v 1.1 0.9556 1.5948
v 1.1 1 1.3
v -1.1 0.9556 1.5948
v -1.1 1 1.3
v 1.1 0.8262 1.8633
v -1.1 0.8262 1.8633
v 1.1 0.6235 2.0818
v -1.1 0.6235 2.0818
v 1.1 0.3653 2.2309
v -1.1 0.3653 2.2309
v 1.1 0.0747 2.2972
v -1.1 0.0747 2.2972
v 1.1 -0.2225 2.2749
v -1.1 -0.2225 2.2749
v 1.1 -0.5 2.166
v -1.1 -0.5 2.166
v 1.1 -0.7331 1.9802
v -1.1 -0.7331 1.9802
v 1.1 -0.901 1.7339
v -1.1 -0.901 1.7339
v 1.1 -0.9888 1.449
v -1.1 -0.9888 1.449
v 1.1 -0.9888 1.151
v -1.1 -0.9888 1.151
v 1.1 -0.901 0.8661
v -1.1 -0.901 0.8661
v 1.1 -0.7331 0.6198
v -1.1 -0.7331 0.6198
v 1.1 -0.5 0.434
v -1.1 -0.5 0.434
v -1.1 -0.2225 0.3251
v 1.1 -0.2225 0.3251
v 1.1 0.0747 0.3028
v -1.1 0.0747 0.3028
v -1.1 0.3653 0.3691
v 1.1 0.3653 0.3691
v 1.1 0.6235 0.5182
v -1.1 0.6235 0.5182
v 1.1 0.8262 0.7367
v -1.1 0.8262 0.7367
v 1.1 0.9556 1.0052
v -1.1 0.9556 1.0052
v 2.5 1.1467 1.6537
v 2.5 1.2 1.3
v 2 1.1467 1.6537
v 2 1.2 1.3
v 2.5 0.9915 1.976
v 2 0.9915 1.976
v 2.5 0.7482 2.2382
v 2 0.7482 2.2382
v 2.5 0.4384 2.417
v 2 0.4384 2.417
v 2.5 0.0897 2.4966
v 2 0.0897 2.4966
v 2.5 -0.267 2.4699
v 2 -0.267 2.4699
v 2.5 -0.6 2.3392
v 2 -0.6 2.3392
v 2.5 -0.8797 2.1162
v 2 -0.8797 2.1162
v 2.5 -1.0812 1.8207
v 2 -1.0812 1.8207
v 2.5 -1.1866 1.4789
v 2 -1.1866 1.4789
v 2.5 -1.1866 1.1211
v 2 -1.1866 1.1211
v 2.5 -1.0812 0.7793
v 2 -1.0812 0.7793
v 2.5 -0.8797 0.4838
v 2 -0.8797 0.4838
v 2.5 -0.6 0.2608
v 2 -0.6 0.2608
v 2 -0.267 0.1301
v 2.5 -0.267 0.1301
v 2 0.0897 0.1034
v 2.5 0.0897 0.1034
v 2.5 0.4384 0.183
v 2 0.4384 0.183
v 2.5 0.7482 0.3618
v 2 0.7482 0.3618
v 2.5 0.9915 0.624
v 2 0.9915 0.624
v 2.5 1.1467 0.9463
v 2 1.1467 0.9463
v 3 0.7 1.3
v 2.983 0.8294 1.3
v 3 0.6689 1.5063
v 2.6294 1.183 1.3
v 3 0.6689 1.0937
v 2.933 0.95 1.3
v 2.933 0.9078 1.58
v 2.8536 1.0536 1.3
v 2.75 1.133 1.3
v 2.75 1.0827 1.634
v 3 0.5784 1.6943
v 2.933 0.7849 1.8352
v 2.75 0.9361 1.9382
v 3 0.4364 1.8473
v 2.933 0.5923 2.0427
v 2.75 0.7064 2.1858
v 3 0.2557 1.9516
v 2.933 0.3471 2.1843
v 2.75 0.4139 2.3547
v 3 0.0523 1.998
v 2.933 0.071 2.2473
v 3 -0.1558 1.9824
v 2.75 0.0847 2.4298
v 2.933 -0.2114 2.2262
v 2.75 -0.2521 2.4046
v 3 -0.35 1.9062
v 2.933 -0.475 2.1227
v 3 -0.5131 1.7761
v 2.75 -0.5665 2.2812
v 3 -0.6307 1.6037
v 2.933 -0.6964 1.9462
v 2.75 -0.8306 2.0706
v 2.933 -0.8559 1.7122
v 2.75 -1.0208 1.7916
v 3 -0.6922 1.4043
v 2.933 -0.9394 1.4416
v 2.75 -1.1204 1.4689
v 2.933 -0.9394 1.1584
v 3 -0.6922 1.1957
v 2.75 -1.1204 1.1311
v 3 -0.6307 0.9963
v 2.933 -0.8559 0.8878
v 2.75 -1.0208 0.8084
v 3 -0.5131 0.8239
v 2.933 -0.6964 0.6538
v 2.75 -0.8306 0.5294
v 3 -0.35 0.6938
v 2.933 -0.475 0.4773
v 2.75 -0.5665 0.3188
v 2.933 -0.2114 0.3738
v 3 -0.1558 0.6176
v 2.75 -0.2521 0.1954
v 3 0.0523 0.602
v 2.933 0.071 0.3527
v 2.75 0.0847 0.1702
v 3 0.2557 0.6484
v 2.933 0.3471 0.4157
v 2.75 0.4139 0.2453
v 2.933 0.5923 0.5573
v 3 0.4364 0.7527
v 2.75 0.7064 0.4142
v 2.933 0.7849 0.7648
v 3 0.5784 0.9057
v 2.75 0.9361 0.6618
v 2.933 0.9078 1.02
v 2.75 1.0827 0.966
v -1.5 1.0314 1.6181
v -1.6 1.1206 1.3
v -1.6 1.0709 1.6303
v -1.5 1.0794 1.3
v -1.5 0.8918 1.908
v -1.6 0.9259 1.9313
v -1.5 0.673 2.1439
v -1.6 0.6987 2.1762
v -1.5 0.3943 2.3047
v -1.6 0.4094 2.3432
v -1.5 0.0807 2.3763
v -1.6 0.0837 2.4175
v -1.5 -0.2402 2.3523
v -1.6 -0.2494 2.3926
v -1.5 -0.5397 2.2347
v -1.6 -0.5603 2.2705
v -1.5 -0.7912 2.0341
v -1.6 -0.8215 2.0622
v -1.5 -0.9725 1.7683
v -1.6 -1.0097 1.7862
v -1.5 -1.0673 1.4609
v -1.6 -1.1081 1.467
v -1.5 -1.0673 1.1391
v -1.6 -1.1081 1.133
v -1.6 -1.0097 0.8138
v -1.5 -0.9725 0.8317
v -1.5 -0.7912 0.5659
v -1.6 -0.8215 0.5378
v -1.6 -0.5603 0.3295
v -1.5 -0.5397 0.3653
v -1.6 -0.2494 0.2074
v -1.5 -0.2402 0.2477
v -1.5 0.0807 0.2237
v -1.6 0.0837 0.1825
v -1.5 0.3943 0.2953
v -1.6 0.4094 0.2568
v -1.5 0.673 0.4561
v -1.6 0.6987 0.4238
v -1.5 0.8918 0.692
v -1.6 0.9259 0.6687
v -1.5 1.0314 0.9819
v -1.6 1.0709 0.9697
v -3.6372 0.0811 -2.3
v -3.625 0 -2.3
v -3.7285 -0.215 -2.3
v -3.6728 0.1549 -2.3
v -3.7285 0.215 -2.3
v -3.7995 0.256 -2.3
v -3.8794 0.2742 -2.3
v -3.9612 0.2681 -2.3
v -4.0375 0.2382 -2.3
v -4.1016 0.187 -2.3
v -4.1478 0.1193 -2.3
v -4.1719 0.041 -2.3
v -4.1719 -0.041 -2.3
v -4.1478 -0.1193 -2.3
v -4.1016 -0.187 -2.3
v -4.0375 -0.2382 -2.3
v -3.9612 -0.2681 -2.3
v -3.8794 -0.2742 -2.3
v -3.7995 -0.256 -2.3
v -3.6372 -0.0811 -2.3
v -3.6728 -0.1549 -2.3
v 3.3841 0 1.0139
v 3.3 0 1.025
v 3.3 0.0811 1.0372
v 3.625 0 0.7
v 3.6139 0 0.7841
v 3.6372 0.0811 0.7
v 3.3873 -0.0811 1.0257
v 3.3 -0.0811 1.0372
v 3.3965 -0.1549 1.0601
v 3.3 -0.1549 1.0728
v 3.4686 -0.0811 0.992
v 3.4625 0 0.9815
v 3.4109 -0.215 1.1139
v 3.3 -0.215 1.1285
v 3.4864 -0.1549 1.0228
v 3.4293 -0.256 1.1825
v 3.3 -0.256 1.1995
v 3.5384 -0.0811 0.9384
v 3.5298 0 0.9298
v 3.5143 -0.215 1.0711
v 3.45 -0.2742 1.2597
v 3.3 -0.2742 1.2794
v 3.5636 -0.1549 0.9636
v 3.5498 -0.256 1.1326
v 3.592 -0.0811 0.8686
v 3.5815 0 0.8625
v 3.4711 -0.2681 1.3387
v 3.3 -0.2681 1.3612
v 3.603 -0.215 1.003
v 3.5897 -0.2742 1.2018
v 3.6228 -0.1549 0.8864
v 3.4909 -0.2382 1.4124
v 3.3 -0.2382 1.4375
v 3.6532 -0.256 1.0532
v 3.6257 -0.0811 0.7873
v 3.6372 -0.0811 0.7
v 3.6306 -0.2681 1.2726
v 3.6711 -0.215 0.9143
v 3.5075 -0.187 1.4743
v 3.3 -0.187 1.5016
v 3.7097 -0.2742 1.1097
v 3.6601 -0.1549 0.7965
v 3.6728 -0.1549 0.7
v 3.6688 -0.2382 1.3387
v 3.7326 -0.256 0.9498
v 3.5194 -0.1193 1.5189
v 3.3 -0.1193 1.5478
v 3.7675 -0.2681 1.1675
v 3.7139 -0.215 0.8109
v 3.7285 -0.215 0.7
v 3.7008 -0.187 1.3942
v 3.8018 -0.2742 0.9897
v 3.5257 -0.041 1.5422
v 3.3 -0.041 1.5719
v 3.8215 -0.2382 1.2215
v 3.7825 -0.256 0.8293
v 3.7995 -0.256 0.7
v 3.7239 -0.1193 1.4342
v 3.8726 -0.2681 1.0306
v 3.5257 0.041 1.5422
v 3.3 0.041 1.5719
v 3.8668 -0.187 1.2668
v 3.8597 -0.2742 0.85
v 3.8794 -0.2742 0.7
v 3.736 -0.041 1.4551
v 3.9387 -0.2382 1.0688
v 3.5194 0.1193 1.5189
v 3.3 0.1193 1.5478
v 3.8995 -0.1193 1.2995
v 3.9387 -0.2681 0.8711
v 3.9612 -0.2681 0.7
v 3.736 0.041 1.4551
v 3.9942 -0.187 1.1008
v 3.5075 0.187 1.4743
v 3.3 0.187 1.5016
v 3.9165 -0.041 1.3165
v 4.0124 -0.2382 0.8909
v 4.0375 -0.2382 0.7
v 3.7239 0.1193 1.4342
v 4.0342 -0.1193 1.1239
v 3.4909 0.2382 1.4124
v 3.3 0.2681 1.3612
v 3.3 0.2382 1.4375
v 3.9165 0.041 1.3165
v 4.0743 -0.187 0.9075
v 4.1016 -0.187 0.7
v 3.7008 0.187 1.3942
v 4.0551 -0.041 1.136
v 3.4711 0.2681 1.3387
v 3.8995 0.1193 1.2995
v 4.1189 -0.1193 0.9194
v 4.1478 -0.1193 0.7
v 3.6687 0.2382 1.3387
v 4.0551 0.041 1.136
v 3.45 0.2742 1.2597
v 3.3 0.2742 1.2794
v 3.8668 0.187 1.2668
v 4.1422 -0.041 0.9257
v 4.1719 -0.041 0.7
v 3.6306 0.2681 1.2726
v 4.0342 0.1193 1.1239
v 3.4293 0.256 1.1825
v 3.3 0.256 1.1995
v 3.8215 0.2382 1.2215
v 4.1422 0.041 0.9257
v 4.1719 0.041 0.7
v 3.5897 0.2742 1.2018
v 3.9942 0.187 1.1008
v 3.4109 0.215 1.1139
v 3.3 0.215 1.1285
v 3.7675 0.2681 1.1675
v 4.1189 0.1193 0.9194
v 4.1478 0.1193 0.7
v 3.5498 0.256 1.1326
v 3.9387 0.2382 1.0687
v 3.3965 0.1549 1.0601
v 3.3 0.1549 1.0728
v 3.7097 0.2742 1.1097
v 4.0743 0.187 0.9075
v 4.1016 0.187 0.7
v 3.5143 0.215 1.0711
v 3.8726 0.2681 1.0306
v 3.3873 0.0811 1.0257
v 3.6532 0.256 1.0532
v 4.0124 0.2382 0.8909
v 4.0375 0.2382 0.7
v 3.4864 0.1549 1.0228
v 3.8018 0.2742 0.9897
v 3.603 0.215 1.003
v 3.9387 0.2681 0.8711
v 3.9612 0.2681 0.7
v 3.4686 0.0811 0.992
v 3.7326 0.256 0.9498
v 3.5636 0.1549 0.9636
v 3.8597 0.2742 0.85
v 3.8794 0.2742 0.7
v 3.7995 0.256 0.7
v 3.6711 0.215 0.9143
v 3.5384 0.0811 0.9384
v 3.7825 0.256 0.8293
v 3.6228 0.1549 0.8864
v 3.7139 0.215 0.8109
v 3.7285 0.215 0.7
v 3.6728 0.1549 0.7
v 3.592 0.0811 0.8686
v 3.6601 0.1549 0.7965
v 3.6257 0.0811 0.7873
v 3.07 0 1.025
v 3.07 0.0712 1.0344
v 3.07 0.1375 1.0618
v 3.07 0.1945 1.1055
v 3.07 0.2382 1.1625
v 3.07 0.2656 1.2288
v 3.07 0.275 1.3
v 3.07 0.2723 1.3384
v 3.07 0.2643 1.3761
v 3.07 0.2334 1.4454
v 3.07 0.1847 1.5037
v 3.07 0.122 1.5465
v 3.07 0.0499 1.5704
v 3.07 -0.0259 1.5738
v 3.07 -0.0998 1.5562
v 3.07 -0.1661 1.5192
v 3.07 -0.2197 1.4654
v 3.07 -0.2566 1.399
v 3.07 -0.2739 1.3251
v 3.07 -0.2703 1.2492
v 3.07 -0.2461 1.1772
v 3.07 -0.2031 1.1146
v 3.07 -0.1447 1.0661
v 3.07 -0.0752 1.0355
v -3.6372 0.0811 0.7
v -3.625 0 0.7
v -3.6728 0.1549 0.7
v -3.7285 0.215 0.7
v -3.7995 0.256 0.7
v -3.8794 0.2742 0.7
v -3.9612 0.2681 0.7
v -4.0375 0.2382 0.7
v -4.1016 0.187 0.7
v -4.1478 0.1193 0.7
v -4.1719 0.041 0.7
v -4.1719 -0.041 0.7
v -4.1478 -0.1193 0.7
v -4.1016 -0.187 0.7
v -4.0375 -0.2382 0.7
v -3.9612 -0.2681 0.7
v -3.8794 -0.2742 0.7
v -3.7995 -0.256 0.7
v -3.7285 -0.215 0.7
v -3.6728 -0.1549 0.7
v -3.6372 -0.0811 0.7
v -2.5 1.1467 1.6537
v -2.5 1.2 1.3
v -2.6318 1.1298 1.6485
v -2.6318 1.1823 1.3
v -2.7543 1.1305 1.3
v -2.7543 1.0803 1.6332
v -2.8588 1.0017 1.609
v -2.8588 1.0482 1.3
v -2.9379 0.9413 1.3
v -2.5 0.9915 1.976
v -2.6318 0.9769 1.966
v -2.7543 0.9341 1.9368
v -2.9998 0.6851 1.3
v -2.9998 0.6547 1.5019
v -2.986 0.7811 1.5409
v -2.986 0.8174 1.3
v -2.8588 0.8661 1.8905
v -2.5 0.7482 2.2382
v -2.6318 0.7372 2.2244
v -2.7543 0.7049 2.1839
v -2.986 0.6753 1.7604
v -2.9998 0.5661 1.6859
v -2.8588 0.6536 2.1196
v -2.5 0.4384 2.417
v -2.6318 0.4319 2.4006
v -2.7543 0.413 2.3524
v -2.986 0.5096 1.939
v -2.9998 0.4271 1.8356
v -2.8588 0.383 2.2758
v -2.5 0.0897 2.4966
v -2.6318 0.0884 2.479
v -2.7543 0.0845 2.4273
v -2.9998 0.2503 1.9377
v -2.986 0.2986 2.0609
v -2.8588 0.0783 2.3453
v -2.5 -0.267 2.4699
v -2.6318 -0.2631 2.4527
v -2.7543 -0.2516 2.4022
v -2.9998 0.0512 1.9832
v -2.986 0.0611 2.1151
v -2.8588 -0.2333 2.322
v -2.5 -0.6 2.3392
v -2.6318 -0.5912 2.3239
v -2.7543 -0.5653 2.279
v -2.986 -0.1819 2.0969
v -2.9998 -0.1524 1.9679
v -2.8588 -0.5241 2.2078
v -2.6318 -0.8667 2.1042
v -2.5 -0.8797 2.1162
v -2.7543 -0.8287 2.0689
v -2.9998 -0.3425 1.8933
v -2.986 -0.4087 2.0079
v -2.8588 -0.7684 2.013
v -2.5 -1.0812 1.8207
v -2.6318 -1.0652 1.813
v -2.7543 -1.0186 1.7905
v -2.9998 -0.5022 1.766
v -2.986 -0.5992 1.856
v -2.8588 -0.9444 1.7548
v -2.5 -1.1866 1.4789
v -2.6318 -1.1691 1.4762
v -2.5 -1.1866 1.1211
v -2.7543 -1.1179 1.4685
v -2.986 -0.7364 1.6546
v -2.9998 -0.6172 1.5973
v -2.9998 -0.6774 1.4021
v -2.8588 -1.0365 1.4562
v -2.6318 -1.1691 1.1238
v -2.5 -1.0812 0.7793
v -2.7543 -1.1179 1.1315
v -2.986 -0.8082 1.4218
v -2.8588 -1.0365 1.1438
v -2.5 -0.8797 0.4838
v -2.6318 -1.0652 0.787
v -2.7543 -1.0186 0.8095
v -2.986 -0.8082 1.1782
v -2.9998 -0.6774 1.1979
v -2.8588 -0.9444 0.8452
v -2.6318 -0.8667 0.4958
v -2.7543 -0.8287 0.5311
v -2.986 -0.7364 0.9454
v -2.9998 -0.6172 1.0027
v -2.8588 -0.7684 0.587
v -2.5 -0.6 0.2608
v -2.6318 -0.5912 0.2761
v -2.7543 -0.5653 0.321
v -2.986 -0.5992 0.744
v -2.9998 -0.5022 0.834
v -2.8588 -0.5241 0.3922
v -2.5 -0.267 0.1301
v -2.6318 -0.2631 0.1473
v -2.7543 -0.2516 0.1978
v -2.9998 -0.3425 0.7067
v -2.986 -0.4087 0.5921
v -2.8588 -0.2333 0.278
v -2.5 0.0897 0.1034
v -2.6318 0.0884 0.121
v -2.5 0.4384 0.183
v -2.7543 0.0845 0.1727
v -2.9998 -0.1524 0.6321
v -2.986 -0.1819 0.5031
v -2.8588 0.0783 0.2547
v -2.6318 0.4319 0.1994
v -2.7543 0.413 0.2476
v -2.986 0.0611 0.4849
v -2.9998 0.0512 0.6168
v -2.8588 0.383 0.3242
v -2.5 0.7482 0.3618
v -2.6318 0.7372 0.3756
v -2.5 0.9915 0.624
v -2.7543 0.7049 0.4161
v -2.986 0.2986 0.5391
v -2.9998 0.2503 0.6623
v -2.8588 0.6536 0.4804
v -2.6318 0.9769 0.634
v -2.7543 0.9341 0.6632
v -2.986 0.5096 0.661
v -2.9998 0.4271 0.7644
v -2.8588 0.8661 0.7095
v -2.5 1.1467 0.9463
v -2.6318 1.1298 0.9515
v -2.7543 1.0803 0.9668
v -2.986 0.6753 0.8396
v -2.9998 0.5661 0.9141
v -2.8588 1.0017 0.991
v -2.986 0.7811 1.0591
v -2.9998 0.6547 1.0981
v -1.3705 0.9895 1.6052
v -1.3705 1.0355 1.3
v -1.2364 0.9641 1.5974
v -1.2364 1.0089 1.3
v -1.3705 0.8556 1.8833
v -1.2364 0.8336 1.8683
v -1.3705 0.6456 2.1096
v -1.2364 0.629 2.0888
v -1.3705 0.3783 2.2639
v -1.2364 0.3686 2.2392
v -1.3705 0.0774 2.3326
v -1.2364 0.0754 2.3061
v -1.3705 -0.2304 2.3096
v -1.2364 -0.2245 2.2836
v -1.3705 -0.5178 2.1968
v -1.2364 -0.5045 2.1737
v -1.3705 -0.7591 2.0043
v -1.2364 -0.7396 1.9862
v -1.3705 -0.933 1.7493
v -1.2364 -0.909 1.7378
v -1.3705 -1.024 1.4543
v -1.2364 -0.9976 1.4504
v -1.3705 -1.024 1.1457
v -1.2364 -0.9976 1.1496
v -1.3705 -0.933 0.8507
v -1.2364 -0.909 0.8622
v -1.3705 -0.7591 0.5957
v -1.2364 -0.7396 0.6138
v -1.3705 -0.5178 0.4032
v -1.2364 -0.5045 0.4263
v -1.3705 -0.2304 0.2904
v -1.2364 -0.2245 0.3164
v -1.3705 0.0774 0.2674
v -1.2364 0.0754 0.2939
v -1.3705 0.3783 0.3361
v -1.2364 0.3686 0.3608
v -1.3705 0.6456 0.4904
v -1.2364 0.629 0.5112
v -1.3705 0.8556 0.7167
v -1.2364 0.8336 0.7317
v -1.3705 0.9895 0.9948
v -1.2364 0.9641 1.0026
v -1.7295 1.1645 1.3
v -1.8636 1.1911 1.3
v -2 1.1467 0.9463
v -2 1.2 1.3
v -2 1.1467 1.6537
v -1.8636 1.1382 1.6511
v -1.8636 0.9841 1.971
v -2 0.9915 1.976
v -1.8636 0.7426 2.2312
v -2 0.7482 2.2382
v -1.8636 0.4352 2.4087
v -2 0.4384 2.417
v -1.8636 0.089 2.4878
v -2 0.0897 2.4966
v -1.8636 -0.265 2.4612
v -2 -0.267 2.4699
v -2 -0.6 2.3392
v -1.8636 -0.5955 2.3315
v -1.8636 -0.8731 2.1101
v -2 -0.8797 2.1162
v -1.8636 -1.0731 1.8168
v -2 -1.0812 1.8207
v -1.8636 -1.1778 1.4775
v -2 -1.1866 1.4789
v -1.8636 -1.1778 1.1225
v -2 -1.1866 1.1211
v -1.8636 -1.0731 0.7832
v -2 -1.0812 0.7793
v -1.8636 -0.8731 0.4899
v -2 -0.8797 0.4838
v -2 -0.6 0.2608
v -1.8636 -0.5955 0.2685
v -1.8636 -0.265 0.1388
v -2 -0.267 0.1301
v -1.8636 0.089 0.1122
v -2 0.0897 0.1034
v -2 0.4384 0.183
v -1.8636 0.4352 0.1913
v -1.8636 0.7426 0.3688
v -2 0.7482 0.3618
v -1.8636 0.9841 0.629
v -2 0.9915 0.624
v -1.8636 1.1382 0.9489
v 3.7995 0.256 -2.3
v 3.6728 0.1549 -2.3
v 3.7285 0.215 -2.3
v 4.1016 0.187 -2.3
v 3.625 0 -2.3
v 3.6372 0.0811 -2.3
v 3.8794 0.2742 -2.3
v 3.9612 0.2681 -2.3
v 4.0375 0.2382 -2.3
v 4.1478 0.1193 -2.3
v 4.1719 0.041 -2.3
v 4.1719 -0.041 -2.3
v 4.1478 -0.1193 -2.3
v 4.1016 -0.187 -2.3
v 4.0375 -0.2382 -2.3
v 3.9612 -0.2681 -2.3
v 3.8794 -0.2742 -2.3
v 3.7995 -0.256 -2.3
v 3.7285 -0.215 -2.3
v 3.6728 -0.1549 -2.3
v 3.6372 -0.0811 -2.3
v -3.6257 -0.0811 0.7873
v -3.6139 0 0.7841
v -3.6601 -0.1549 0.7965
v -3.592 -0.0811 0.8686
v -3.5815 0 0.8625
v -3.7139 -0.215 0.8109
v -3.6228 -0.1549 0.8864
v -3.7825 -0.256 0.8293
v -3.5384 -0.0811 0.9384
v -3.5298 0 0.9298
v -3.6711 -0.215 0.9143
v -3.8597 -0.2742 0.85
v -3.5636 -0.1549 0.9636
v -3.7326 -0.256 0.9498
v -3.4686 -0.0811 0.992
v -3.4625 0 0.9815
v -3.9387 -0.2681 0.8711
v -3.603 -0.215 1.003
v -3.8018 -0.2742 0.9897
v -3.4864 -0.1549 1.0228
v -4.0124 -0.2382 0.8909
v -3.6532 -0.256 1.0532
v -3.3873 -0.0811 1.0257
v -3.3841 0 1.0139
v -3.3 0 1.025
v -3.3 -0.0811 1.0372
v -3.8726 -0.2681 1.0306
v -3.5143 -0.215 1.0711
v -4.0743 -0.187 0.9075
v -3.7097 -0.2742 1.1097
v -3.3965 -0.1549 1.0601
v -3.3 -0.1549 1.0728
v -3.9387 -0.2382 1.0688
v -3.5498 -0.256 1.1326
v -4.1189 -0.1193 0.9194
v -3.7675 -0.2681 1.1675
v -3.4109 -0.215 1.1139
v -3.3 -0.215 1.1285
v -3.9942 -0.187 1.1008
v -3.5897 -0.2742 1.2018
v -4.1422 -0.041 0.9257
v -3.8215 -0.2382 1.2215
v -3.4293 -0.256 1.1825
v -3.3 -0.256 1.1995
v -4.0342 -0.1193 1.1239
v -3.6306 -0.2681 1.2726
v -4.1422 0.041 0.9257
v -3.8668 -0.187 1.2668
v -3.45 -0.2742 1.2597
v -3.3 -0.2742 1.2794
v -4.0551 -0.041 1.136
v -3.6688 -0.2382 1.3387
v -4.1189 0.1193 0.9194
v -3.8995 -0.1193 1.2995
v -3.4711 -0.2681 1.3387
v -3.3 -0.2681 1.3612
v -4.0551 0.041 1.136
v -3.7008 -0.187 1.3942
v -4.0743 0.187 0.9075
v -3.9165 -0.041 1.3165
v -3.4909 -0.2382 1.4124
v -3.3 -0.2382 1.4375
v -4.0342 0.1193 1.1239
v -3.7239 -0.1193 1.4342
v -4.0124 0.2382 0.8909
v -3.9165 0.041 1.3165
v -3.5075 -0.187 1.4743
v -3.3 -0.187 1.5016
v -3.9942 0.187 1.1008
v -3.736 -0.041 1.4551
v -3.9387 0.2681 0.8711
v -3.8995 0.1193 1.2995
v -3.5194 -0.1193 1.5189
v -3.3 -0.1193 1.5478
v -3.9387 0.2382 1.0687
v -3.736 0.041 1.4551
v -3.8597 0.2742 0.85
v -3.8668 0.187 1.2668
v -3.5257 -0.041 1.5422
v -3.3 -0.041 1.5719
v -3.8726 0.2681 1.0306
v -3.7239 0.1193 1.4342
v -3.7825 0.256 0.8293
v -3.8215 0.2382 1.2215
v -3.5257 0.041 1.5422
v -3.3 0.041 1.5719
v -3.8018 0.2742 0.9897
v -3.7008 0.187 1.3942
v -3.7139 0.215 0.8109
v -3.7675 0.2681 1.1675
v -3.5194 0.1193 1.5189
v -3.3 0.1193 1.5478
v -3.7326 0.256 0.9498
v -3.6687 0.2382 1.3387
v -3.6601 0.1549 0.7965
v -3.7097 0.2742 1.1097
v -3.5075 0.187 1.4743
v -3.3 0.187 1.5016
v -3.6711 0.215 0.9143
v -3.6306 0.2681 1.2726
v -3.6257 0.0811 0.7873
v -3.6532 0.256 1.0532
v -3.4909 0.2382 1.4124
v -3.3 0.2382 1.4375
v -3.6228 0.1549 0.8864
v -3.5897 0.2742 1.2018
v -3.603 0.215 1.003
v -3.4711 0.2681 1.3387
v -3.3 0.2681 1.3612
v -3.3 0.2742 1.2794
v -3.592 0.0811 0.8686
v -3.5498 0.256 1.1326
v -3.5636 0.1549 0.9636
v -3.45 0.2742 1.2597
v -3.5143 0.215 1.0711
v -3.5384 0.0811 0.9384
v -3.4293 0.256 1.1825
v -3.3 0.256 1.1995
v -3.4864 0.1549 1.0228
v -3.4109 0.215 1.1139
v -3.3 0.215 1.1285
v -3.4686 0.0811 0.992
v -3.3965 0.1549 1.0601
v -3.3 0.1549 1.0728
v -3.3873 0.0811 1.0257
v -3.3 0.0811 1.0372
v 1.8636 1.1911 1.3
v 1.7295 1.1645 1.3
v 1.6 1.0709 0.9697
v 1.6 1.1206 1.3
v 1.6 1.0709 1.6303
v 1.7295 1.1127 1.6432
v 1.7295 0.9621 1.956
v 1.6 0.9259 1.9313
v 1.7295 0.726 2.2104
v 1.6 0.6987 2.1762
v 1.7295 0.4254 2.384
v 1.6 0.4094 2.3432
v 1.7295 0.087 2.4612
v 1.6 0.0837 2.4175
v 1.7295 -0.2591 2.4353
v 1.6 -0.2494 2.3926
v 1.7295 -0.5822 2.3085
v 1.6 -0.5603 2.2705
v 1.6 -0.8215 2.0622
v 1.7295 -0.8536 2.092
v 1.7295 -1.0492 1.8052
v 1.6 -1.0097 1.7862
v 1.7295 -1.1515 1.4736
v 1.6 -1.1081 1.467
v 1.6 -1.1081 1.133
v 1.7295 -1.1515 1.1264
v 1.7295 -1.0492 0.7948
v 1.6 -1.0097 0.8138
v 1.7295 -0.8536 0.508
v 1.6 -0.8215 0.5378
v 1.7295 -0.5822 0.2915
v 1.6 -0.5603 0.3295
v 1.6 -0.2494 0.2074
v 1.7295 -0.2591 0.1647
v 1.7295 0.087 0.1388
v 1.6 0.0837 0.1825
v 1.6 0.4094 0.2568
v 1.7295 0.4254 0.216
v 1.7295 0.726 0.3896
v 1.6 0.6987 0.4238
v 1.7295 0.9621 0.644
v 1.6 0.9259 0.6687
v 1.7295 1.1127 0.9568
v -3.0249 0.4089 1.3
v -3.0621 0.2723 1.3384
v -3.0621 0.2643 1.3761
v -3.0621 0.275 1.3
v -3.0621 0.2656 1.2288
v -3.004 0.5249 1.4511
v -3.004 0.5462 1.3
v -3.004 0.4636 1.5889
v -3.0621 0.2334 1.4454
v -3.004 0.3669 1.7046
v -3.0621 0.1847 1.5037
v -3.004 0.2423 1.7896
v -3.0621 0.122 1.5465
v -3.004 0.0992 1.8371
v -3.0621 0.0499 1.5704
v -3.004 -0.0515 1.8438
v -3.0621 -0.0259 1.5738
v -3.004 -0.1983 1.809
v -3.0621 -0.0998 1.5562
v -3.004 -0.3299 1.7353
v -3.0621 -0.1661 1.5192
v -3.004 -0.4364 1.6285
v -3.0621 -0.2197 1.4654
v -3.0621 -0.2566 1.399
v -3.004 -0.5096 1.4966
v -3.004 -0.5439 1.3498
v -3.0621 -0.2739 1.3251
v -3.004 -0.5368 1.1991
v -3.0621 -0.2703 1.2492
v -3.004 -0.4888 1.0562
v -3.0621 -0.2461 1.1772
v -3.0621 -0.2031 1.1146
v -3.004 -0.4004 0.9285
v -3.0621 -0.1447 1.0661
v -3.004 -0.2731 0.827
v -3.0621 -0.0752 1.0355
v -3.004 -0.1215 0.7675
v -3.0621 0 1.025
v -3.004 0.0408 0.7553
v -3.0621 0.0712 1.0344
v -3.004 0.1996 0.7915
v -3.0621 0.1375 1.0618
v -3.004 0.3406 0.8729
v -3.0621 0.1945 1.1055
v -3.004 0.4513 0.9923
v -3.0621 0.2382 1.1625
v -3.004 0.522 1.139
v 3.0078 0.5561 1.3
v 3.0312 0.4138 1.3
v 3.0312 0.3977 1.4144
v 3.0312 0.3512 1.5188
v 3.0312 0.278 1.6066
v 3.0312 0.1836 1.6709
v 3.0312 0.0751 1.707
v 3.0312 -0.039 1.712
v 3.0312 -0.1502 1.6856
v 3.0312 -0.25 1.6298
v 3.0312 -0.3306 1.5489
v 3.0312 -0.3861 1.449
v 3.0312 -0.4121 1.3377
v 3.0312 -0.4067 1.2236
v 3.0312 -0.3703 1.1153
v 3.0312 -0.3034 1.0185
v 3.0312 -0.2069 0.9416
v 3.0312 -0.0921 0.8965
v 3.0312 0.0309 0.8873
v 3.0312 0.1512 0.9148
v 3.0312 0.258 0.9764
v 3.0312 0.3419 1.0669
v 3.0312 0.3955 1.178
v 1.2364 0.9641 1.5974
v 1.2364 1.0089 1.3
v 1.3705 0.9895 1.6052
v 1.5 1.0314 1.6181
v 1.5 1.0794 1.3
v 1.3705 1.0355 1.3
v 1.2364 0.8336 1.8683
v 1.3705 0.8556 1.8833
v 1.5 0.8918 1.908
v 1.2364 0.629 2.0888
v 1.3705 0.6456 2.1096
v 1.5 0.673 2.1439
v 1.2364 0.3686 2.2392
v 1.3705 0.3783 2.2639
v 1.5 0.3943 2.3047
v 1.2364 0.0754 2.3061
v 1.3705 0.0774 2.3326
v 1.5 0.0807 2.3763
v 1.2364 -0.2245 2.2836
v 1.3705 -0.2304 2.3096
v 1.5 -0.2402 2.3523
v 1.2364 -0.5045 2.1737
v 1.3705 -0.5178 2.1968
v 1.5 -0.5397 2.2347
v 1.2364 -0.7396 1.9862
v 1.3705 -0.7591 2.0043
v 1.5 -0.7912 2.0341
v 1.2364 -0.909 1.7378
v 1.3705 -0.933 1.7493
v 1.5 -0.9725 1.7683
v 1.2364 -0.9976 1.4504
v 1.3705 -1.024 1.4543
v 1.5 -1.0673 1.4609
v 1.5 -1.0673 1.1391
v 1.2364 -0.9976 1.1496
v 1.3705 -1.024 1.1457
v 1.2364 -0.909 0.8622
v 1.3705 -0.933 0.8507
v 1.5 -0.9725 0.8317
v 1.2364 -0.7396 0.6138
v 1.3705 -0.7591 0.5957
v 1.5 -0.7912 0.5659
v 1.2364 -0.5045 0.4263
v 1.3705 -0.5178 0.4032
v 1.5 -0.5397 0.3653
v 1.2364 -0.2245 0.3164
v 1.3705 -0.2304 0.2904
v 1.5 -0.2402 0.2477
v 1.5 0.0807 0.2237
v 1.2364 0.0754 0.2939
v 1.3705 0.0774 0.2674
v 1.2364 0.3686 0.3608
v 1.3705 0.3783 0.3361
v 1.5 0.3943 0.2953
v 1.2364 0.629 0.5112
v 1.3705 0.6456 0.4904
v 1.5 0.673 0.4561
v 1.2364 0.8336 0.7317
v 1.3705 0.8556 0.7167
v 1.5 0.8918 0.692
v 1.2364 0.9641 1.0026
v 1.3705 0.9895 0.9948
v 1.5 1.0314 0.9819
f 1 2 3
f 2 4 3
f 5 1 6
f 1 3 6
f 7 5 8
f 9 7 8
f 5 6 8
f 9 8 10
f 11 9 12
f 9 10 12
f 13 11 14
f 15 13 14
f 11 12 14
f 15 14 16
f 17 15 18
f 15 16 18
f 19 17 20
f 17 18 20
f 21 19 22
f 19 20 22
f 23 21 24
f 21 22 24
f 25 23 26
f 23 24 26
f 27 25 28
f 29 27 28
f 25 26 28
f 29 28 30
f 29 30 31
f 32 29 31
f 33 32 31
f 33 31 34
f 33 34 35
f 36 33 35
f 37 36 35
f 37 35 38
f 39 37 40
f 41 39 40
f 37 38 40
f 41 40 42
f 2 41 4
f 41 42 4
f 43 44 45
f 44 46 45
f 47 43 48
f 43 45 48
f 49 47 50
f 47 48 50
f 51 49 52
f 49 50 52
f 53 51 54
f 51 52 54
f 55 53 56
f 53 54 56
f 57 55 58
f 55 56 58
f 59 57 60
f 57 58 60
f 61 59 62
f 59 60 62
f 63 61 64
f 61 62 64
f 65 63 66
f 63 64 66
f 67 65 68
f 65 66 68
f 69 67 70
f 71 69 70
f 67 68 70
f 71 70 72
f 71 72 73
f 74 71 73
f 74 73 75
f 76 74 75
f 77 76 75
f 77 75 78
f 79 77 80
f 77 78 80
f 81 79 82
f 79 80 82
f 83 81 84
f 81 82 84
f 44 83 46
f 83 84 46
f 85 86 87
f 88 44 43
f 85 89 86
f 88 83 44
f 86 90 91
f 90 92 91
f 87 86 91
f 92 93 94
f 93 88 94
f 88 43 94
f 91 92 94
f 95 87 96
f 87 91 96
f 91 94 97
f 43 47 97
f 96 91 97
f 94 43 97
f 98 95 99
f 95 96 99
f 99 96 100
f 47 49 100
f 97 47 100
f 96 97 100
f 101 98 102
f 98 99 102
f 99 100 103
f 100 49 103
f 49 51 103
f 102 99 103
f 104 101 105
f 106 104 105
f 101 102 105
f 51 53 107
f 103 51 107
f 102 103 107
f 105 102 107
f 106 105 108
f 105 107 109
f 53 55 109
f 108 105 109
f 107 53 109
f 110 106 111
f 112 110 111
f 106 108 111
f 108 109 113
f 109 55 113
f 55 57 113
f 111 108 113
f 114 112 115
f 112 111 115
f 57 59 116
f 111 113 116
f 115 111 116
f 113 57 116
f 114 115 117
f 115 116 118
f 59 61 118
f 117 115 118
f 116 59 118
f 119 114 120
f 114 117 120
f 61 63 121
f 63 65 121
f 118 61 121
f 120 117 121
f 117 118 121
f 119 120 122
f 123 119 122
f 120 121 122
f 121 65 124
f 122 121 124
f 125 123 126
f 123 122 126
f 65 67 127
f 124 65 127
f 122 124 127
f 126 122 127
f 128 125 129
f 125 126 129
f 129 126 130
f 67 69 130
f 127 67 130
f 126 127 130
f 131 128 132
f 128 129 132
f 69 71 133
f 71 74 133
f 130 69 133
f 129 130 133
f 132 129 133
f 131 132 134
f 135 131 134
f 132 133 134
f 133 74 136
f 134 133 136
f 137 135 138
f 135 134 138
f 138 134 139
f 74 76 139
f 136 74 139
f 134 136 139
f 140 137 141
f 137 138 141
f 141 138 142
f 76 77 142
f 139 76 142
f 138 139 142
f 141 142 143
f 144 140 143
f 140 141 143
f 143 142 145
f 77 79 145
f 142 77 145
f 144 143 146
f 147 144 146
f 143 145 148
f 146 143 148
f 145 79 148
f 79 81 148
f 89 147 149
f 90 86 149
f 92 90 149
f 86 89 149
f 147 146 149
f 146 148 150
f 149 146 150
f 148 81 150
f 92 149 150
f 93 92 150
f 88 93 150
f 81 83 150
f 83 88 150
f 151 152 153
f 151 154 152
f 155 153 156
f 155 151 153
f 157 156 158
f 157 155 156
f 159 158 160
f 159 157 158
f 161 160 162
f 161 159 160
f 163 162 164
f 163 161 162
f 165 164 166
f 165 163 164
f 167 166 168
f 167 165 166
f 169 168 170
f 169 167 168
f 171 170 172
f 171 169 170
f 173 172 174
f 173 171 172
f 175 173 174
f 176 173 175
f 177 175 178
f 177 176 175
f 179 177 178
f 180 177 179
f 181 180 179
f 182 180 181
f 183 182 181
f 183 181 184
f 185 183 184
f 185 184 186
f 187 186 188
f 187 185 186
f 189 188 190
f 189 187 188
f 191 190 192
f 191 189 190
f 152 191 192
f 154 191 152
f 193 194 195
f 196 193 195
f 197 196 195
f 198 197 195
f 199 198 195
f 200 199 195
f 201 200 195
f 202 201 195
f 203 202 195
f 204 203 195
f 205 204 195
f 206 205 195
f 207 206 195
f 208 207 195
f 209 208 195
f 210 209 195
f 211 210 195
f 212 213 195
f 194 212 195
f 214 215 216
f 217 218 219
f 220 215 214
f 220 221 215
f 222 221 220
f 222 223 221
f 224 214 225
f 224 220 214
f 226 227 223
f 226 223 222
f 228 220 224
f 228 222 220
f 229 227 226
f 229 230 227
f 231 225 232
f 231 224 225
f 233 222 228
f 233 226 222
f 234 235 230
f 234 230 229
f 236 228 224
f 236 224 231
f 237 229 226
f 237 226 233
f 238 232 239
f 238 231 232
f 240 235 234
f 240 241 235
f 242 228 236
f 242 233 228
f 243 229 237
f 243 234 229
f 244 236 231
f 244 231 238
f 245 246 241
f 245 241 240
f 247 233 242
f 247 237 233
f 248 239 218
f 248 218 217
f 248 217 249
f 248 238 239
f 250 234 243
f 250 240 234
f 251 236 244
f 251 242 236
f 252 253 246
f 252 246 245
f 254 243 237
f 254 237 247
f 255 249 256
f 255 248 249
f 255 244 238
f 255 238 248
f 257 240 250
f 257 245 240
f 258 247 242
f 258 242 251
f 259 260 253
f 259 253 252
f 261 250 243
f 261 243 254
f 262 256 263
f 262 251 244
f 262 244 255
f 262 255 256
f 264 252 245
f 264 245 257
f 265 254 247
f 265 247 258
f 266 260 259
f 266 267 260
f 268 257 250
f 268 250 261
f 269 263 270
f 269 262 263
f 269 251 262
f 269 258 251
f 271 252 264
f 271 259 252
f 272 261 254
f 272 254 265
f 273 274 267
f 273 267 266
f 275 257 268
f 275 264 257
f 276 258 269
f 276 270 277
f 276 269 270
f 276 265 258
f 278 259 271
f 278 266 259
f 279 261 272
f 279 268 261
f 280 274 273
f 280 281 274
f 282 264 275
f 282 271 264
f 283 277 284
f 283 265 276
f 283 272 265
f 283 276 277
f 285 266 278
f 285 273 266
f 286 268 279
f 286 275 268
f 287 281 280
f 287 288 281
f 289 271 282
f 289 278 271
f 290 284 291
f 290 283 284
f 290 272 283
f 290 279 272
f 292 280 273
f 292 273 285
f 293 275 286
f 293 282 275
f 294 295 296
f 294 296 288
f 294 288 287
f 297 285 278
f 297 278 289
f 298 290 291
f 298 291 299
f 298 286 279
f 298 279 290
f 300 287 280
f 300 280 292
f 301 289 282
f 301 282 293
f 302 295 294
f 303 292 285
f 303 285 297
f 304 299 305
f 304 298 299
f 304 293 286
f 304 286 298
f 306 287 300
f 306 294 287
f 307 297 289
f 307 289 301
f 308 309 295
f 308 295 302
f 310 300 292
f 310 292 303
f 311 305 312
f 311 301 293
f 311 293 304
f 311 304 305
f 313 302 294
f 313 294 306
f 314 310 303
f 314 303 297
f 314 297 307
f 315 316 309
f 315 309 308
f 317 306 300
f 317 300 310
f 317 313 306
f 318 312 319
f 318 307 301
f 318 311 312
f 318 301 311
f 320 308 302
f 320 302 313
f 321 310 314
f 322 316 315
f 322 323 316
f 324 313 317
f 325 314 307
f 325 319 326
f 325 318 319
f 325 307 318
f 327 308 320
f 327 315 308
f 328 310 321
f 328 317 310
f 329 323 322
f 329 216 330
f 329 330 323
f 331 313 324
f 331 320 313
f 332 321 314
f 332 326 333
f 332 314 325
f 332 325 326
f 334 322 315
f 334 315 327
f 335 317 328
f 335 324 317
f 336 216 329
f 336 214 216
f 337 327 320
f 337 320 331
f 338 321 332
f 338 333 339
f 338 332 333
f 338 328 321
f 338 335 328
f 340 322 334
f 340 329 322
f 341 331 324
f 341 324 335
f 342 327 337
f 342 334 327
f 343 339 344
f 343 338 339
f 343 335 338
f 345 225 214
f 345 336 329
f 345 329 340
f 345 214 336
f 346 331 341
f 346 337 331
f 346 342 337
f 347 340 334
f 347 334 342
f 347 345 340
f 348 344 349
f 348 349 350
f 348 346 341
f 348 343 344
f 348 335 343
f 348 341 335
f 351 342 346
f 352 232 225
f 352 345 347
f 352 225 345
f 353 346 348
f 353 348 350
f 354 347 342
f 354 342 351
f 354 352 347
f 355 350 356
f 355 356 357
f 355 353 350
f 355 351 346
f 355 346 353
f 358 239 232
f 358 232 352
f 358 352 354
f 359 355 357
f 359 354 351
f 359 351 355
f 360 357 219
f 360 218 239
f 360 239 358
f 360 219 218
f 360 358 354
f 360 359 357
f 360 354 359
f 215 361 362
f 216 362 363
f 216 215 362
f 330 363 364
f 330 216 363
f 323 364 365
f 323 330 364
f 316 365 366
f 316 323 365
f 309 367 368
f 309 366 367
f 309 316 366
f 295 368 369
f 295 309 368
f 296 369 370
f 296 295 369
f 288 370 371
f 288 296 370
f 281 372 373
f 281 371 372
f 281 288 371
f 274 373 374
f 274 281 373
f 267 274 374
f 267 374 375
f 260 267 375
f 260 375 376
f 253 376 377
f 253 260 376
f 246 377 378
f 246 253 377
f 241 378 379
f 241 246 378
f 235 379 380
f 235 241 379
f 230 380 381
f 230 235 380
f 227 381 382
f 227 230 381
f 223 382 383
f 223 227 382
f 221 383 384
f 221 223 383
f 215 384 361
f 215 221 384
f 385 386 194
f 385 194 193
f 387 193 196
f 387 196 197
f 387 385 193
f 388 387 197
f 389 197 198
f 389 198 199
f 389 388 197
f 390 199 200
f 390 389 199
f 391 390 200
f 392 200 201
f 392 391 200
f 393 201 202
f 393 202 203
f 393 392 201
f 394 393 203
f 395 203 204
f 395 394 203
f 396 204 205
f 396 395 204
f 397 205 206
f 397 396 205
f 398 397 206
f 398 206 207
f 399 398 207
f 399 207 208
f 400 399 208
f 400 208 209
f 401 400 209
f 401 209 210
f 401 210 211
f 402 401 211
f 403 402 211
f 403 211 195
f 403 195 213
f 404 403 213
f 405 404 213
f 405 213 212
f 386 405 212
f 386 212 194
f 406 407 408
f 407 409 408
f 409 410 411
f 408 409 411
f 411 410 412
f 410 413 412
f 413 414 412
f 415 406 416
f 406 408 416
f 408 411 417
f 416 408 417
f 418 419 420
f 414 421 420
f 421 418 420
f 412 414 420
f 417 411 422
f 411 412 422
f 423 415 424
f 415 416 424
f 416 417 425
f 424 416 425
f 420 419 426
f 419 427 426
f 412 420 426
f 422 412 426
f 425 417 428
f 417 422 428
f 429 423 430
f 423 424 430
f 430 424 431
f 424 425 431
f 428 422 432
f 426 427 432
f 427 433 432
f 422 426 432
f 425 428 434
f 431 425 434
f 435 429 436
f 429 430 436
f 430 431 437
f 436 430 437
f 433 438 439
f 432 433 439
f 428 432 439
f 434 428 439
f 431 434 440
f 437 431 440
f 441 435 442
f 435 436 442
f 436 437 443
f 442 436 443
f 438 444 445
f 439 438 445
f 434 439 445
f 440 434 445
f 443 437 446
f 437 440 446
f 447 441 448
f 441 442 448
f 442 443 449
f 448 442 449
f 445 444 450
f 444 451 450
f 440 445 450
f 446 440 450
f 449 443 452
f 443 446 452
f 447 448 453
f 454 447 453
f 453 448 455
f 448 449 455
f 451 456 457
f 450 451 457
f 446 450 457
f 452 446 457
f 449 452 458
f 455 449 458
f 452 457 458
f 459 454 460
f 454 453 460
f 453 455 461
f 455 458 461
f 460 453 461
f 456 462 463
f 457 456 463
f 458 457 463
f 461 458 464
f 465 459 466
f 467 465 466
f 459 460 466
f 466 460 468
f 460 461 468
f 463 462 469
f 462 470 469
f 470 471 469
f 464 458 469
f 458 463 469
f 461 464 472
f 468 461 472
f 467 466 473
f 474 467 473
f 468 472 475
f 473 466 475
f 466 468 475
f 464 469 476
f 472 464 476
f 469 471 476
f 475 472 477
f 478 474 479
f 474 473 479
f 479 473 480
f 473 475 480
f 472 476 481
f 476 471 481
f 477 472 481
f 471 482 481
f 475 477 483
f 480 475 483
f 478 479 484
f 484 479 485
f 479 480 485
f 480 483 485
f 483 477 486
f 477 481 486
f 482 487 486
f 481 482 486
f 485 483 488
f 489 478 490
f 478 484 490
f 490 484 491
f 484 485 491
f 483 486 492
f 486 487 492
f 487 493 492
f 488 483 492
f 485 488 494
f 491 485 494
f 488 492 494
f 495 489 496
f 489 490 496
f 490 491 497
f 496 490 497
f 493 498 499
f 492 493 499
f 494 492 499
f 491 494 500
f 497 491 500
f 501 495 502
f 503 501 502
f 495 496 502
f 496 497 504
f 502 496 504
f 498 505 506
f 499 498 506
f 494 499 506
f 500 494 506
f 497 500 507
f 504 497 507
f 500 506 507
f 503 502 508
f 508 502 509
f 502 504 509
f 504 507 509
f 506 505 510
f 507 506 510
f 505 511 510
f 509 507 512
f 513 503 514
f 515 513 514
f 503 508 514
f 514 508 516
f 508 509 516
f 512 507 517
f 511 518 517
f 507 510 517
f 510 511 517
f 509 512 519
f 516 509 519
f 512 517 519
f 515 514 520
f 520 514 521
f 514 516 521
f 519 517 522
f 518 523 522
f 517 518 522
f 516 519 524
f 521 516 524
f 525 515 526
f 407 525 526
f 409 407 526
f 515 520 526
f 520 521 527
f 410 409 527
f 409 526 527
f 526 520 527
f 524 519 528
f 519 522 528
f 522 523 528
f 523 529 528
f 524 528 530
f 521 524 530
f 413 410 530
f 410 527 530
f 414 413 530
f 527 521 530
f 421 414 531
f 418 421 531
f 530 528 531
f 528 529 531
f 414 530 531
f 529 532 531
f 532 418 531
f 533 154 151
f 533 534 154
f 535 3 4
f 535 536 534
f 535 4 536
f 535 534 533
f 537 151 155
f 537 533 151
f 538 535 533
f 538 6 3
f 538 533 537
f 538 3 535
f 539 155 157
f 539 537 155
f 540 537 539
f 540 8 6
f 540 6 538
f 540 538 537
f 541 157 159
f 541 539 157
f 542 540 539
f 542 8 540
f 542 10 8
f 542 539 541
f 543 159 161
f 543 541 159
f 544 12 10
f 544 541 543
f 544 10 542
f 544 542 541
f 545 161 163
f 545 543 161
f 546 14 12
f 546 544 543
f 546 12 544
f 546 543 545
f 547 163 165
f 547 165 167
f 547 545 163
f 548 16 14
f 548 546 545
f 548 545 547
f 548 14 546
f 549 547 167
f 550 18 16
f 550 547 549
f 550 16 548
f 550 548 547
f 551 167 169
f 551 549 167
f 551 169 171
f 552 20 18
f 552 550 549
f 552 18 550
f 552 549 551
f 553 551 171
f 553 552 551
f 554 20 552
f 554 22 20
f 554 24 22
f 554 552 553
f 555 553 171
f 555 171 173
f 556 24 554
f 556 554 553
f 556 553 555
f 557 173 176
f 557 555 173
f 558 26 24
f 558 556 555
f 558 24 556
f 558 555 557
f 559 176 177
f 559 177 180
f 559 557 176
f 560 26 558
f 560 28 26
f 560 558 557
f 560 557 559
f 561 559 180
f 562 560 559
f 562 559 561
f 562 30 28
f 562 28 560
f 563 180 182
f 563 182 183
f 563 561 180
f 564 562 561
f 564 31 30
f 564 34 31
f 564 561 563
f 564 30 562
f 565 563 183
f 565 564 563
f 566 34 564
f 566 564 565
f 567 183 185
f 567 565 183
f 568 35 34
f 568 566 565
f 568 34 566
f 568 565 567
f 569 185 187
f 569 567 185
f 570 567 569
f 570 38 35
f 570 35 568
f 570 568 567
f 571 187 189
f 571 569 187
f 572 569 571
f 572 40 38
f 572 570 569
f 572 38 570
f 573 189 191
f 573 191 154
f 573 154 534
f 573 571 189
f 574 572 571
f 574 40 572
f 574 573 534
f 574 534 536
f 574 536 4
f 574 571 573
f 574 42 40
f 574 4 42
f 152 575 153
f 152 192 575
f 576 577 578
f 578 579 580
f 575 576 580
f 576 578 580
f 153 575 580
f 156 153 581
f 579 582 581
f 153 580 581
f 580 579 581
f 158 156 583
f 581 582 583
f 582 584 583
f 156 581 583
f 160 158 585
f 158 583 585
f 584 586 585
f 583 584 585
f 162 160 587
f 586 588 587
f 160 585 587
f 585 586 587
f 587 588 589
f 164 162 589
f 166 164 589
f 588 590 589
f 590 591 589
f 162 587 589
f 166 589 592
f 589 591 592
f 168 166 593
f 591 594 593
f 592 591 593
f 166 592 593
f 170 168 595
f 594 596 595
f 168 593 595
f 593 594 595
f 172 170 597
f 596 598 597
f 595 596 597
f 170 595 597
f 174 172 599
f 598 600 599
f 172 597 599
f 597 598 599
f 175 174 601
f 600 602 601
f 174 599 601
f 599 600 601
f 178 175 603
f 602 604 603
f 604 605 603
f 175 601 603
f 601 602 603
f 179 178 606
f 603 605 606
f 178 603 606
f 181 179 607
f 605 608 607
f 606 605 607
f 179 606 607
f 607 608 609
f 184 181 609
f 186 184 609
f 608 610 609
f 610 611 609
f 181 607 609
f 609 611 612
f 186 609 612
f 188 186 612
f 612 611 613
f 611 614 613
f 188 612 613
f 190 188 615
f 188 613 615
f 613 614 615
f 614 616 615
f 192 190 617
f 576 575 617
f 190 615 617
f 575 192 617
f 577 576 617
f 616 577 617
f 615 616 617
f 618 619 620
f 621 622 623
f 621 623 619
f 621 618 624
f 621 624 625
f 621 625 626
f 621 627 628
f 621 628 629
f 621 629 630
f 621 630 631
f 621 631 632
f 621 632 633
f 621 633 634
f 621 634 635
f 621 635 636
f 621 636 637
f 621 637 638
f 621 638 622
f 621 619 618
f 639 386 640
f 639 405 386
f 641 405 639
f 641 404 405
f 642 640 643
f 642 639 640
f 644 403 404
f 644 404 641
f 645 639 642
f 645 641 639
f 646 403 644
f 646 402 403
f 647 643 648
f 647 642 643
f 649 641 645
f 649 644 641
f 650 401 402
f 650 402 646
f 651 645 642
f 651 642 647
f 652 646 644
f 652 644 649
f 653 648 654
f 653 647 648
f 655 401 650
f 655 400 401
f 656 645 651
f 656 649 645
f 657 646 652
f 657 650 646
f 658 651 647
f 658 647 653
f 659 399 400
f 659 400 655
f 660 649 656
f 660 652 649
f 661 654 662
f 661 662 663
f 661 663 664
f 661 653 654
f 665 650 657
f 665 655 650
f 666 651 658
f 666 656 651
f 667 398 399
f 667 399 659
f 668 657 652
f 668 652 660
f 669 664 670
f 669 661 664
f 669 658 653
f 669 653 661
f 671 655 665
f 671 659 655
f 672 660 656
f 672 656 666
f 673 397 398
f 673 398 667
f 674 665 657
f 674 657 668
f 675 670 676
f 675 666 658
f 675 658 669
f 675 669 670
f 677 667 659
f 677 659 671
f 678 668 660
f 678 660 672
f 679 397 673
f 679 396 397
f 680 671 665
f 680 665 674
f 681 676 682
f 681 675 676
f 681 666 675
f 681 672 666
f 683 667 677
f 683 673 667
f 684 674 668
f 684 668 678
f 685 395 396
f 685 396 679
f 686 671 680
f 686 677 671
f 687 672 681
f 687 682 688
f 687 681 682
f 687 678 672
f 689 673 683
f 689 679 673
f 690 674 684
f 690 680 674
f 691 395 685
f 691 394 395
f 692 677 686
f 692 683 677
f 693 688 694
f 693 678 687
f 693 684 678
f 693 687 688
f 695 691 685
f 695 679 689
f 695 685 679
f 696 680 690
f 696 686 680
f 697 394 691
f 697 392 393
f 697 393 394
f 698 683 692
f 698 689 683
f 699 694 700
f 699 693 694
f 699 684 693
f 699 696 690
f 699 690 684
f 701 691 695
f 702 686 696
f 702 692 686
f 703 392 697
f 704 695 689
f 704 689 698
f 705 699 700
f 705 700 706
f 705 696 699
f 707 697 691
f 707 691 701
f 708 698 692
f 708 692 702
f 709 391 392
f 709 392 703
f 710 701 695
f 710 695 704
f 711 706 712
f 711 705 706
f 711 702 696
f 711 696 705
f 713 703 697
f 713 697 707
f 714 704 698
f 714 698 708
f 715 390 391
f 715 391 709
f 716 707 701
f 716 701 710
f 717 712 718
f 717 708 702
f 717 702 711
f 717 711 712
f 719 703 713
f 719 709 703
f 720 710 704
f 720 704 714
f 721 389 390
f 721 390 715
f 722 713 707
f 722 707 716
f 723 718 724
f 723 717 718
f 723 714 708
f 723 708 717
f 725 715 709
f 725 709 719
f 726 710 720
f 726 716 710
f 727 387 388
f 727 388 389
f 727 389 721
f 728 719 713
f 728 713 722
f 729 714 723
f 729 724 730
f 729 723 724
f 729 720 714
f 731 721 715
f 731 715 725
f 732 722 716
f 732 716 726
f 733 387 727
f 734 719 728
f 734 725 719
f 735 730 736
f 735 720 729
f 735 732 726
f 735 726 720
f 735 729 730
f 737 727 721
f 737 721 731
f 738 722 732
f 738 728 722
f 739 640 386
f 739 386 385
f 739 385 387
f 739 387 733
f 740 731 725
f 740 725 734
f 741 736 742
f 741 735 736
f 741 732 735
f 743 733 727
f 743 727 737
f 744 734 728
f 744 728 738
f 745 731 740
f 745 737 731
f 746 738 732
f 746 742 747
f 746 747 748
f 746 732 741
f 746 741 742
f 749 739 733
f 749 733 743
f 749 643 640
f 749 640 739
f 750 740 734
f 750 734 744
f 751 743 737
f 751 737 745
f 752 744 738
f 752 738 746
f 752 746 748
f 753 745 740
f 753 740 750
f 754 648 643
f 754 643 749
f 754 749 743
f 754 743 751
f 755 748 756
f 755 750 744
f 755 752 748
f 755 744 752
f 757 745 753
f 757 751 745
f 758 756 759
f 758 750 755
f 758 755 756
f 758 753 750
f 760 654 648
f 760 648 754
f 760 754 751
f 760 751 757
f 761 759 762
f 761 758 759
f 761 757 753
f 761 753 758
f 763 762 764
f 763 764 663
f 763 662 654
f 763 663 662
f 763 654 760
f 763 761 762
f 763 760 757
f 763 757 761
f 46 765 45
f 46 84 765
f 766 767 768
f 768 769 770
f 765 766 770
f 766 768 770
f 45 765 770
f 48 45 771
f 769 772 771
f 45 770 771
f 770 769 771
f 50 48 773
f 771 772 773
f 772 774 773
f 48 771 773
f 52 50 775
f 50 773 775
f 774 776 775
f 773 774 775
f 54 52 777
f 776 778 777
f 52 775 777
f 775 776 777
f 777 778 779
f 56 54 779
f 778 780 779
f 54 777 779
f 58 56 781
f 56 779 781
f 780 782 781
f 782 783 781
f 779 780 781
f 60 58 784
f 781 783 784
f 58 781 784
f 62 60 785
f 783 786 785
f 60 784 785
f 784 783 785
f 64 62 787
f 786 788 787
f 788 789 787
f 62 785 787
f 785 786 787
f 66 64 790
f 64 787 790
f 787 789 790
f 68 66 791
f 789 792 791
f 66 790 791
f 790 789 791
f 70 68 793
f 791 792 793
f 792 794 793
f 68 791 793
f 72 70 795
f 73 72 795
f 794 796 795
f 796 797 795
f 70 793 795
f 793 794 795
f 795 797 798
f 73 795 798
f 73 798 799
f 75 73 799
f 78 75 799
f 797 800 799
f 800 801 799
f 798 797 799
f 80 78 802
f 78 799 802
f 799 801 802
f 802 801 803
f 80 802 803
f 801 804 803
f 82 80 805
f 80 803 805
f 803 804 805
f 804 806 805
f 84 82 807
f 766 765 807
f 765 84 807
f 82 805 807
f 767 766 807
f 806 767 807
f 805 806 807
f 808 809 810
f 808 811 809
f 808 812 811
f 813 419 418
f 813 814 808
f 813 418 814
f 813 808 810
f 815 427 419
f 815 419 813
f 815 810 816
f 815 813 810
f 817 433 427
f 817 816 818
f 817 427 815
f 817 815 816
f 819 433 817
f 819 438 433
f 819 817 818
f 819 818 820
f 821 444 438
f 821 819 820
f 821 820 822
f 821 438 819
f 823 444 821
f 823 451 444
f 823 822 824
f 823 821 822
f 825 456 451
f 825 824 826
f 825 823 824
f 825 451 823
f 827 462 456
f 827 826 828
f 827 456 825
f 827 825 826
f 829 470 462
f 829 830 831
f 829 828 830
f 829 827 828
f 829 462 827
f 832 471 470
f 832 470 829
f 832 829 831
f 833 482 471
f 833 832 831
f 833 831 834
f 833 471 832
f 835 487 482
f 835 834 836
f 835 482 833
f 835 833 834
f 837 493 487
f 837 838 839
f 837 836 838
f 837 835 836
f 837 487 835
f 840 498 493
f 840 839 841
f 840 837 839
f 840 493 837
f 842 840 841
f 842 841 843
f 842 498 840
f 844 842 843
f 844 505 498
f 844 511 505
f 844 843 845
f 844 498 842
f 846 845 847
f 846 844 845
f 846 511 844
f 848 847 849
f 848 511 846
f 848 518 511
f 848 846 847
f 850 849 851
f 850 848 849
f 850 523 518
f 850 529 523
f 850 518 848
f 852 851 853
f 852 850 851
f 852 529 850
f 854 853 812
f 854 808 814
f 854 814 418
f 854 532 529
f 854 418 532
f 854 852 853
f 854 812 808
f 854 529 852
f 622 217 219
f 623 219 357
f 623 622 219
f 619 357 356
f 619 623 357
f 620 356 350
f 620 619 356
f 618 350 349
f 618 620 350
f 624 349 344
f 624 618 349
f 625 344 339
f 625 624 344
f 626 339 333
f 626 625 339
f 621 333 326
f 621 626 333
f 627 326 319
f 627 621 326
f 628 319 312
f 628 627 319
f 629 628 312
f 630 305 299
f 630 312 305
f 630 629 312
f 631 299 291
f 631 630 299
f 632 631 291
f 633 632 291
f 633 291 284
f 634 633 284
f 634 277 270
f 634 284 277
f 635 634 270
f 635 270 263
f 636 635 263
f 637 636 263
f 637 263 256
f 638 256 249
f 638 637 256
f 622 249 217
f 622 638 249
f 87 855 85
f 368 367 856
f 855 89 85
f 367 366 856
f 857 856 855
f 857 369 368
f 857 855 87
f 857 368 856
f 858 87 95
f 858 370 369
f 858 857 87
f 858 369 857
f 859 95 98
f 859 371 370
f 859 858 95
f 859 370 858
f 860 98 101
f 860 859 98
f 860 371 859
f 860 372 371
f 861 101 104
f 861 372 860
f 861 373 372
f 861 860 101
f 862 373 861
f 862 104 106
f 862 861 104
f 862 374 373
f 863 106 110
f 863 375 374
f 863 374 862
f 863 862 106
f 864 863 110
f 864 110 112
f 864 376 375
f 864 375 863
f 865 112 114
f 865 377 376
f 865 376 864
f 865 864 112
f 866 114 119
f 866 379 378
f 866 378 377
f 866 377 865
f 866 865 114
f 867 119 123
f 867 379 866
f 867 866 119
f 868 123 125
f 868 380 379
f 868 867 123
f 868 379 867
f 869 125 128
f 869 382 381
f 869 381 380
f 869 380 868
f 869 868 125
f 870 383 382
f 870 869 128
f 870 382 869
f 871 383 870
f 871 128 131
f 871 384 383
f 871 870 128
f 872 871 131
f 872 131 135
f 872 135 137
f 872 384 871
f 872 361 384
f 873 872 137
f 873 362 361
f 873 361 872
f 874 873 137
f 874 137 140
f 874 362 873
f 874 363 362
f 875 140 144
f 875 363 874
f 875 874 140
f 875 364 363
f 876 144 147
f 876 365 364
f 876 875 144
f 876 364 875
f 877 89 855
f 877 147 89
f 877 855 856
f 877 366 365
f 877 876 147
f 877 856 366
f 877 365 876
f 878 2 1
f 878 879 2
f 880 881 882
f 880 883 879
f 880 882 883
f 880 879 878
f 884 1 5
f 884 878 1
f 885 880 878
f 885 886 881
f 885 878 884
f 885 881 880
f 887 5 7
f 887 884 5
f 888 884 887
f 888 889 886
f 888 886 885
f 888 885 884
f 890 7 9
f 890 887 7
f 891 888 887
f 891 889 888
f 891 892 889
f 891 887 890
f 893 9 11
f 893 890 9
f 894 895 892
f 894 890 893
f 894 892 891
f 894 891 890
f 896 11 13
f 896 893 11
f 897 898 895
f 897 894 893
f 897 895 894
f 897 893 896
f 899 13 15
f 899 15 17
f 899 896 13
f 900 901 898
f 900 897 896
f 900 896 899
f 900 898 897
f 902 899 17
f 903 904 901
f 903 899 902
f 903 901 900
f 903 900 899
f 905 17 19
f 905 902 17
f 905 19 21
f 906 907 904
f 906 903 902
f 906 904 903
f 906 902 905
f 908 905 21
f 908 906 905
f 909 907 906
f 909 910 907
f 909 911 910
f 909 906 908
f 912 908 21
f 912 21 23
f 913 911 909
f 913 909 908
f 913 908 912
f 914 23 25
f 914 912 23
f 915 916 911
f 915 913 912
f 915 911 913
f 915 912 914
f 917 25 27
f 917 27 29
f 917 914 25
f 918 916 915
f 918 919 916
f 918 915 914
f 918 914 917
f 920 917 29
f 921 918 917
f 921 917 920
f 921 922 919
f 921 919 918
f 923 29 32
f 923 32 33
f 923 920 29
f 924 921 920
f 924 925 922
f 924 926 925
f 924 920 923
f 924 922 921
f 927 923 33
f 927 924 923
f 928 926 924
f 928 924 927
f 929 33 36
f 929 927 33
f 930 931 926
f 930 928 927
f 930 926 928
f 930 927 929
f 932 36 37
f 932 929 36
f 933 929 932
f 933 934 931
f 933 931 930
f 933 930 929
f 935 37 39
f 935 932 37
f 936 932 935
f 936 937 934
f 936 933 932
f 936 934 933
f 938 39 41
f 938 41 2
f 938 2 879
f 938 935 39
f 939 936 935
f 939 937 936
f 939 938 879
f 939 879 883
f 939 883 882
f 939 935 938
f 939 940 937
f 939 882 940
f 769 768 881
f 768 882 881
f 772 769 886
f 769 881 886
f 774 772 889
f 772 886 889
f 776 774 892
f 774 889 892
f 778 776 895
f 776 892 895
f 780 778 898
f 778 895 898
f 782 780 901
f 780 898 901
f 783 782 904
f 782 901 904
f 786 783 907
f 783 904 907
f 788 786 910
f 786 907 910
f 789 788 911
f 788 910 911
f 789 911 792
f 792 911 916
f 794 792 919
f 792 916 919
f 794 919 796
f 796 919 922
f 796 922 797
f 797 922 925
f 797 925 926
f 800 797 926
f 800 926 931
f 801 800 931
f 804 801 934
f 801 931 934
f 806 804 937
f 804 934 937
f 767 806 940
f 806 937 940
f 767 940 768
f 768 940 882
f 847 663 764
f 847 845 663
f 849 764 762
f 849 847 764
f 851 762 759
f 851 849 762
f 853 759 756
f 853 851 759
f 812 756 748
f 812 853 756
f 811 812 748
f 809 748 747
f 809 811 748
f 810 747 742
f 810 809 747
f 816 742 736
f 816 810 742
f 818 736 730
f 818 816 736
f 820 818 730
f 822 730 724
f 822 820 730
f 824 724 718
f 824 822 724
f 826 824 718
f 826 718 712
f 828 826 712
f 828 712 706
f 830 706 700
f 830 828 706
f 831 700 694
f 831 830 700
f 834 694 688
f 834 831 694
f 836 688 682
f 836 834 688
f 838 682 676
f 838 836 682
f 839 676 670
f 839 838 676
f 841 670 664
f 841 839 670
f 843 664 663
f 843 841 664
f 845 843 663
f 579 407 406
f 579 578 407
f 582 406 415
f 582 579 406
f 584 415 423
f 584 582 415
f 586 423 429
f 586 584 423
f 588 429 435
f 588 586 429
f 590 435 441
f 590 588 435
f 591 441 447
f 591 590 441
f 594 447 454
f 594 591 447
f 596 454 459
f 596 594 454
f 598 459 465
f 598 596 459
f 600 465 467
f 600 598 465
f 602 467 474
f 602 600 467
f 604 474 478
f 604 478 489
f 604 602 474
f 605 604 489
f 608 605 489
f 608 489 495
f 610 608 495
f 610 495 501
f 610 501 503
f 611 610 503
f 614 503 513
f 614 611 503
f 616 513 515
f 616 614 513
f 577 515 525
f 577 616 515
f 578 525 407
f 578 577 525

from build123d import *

# Parameters (mm, degrees)
REVOLVE_ONTO_SKETCH002_ROLL_ANGLE = 90
REVOLVE_ROLL_ANGLE                = -90
SKETCH001_R                       = 0.275
SWEEP_ROLL_ANGLE                  = -90


with BuildPart() as revolve_body:
    # Sketch002 as drawn → Revolve (revolve)
    with BuildSketch(Plane.XY):
        with BuildLine():
            Line((-2.5, 1.2), (-2, 1.2))
            ThreePointArc((-1.6, 1.12065), (-1.796103, 1.179971), (-2, 1.2))
            Line((-1.6, 1.12065), (-1.5, 1.07935))
            ThreePointArc((-1.5, 1.07935), (-1.303897, 1.020029), (-1.1, 1))
            Line((1.1, 1), (-1.1, 1))
            ThreePointArc((1.1, 1), (1.303897, 1.020029), (1.5, 1.07935))
            Line((1.6, 1.12065), (1.5, 1.07935))
            ThreePointArc((2, 1.2), (1.796103, 1.179971), (1.6, 1.12065))
            Line((2.5, 1.2), (2, 1.2))
            ThreePointArc((3, 0.7), (2.853553, 1.053553), (2.5, 1.2))
            ThreePointArc((3, 0.7), (3.050926, 0.335979), (3.2, 0))
            Line((3.2, 0), (-3.2, 0))
            ThreePointArc((-3.2, 0), (-3.045646, 0.326695), (-2.999778, 0.685095))
            ThreePointArc((-2.5, 1.2), (-2.858785, 1.048244), (-2.999778, 0.685095))
        make_face()
    revolve(axis=Axis((0, 0, 0), (1, 0, 0)))


with BuildPart() as revolve_body_1:
    # Revolve onto Sketch002 roll: moved
    add(revolve_body.part.rotate(Axis((0, 0, 0), (1, 0, 0)), REVOLVE_ONTO_SKETCH002_ROLL_ANGLE))


with BuildPart() as revolve_body_2:
    # Revolve onto Sketch002 placement: moved
    add(revolve_body_1.part)


with BuildPart() as revolve_body_3:
    # Revolve roll: moved
    add(revolve_body_2.part.rotate(Axis((0, 0, 0), (1, 0, 0)), REVOLVE_ROLL_ANGLE))


with BuildPart() as revolve_body_4:
    # Revolve placement: moved
    add(revolve_body_3.part.moved(Location((0, 0, 1.3))))


with BuildPart() as resistor:
    # Sweep: sweep along a path in Sketch
    with BuildLine(Plane.XY) as sweep_path:
        Line((-3.9, 3.6), (-3.9, 0.6))
        ThreePointArc((-3.9, 0.6), (-3.724264, 0.175736), (-3.3, 0))
        Line((-3.3, 0), (3.3, 0))
        ThreePointArc((3.3, 0), (3.724264, 0.175736), (3.9, 0.6))
        Line((3.9, 0.6), (3.9, 3.6))
    # Sketch001 → Sweep (sweep)
    with BuildSketch(Plane.YZ):
        Circle(SKETCH001_R)
    sweep(path=sweep_path.line)


with BuildPart() as resistor_1:
    # Sweep roll: moved
    add(resistor.part.rotate(Axis((0, 0, 0), (1, 0, 0)), SWEEP_ROLL_ANGLE))


with BuildPart() as resistor_2:
    # Sweep placement: moved
    add(resistor_1.part.moved(Location((0, 0, 1.3))))

    # Fusion: union Revolve body
    add(revolve_body_4.part)


solid = resistor_2.part
